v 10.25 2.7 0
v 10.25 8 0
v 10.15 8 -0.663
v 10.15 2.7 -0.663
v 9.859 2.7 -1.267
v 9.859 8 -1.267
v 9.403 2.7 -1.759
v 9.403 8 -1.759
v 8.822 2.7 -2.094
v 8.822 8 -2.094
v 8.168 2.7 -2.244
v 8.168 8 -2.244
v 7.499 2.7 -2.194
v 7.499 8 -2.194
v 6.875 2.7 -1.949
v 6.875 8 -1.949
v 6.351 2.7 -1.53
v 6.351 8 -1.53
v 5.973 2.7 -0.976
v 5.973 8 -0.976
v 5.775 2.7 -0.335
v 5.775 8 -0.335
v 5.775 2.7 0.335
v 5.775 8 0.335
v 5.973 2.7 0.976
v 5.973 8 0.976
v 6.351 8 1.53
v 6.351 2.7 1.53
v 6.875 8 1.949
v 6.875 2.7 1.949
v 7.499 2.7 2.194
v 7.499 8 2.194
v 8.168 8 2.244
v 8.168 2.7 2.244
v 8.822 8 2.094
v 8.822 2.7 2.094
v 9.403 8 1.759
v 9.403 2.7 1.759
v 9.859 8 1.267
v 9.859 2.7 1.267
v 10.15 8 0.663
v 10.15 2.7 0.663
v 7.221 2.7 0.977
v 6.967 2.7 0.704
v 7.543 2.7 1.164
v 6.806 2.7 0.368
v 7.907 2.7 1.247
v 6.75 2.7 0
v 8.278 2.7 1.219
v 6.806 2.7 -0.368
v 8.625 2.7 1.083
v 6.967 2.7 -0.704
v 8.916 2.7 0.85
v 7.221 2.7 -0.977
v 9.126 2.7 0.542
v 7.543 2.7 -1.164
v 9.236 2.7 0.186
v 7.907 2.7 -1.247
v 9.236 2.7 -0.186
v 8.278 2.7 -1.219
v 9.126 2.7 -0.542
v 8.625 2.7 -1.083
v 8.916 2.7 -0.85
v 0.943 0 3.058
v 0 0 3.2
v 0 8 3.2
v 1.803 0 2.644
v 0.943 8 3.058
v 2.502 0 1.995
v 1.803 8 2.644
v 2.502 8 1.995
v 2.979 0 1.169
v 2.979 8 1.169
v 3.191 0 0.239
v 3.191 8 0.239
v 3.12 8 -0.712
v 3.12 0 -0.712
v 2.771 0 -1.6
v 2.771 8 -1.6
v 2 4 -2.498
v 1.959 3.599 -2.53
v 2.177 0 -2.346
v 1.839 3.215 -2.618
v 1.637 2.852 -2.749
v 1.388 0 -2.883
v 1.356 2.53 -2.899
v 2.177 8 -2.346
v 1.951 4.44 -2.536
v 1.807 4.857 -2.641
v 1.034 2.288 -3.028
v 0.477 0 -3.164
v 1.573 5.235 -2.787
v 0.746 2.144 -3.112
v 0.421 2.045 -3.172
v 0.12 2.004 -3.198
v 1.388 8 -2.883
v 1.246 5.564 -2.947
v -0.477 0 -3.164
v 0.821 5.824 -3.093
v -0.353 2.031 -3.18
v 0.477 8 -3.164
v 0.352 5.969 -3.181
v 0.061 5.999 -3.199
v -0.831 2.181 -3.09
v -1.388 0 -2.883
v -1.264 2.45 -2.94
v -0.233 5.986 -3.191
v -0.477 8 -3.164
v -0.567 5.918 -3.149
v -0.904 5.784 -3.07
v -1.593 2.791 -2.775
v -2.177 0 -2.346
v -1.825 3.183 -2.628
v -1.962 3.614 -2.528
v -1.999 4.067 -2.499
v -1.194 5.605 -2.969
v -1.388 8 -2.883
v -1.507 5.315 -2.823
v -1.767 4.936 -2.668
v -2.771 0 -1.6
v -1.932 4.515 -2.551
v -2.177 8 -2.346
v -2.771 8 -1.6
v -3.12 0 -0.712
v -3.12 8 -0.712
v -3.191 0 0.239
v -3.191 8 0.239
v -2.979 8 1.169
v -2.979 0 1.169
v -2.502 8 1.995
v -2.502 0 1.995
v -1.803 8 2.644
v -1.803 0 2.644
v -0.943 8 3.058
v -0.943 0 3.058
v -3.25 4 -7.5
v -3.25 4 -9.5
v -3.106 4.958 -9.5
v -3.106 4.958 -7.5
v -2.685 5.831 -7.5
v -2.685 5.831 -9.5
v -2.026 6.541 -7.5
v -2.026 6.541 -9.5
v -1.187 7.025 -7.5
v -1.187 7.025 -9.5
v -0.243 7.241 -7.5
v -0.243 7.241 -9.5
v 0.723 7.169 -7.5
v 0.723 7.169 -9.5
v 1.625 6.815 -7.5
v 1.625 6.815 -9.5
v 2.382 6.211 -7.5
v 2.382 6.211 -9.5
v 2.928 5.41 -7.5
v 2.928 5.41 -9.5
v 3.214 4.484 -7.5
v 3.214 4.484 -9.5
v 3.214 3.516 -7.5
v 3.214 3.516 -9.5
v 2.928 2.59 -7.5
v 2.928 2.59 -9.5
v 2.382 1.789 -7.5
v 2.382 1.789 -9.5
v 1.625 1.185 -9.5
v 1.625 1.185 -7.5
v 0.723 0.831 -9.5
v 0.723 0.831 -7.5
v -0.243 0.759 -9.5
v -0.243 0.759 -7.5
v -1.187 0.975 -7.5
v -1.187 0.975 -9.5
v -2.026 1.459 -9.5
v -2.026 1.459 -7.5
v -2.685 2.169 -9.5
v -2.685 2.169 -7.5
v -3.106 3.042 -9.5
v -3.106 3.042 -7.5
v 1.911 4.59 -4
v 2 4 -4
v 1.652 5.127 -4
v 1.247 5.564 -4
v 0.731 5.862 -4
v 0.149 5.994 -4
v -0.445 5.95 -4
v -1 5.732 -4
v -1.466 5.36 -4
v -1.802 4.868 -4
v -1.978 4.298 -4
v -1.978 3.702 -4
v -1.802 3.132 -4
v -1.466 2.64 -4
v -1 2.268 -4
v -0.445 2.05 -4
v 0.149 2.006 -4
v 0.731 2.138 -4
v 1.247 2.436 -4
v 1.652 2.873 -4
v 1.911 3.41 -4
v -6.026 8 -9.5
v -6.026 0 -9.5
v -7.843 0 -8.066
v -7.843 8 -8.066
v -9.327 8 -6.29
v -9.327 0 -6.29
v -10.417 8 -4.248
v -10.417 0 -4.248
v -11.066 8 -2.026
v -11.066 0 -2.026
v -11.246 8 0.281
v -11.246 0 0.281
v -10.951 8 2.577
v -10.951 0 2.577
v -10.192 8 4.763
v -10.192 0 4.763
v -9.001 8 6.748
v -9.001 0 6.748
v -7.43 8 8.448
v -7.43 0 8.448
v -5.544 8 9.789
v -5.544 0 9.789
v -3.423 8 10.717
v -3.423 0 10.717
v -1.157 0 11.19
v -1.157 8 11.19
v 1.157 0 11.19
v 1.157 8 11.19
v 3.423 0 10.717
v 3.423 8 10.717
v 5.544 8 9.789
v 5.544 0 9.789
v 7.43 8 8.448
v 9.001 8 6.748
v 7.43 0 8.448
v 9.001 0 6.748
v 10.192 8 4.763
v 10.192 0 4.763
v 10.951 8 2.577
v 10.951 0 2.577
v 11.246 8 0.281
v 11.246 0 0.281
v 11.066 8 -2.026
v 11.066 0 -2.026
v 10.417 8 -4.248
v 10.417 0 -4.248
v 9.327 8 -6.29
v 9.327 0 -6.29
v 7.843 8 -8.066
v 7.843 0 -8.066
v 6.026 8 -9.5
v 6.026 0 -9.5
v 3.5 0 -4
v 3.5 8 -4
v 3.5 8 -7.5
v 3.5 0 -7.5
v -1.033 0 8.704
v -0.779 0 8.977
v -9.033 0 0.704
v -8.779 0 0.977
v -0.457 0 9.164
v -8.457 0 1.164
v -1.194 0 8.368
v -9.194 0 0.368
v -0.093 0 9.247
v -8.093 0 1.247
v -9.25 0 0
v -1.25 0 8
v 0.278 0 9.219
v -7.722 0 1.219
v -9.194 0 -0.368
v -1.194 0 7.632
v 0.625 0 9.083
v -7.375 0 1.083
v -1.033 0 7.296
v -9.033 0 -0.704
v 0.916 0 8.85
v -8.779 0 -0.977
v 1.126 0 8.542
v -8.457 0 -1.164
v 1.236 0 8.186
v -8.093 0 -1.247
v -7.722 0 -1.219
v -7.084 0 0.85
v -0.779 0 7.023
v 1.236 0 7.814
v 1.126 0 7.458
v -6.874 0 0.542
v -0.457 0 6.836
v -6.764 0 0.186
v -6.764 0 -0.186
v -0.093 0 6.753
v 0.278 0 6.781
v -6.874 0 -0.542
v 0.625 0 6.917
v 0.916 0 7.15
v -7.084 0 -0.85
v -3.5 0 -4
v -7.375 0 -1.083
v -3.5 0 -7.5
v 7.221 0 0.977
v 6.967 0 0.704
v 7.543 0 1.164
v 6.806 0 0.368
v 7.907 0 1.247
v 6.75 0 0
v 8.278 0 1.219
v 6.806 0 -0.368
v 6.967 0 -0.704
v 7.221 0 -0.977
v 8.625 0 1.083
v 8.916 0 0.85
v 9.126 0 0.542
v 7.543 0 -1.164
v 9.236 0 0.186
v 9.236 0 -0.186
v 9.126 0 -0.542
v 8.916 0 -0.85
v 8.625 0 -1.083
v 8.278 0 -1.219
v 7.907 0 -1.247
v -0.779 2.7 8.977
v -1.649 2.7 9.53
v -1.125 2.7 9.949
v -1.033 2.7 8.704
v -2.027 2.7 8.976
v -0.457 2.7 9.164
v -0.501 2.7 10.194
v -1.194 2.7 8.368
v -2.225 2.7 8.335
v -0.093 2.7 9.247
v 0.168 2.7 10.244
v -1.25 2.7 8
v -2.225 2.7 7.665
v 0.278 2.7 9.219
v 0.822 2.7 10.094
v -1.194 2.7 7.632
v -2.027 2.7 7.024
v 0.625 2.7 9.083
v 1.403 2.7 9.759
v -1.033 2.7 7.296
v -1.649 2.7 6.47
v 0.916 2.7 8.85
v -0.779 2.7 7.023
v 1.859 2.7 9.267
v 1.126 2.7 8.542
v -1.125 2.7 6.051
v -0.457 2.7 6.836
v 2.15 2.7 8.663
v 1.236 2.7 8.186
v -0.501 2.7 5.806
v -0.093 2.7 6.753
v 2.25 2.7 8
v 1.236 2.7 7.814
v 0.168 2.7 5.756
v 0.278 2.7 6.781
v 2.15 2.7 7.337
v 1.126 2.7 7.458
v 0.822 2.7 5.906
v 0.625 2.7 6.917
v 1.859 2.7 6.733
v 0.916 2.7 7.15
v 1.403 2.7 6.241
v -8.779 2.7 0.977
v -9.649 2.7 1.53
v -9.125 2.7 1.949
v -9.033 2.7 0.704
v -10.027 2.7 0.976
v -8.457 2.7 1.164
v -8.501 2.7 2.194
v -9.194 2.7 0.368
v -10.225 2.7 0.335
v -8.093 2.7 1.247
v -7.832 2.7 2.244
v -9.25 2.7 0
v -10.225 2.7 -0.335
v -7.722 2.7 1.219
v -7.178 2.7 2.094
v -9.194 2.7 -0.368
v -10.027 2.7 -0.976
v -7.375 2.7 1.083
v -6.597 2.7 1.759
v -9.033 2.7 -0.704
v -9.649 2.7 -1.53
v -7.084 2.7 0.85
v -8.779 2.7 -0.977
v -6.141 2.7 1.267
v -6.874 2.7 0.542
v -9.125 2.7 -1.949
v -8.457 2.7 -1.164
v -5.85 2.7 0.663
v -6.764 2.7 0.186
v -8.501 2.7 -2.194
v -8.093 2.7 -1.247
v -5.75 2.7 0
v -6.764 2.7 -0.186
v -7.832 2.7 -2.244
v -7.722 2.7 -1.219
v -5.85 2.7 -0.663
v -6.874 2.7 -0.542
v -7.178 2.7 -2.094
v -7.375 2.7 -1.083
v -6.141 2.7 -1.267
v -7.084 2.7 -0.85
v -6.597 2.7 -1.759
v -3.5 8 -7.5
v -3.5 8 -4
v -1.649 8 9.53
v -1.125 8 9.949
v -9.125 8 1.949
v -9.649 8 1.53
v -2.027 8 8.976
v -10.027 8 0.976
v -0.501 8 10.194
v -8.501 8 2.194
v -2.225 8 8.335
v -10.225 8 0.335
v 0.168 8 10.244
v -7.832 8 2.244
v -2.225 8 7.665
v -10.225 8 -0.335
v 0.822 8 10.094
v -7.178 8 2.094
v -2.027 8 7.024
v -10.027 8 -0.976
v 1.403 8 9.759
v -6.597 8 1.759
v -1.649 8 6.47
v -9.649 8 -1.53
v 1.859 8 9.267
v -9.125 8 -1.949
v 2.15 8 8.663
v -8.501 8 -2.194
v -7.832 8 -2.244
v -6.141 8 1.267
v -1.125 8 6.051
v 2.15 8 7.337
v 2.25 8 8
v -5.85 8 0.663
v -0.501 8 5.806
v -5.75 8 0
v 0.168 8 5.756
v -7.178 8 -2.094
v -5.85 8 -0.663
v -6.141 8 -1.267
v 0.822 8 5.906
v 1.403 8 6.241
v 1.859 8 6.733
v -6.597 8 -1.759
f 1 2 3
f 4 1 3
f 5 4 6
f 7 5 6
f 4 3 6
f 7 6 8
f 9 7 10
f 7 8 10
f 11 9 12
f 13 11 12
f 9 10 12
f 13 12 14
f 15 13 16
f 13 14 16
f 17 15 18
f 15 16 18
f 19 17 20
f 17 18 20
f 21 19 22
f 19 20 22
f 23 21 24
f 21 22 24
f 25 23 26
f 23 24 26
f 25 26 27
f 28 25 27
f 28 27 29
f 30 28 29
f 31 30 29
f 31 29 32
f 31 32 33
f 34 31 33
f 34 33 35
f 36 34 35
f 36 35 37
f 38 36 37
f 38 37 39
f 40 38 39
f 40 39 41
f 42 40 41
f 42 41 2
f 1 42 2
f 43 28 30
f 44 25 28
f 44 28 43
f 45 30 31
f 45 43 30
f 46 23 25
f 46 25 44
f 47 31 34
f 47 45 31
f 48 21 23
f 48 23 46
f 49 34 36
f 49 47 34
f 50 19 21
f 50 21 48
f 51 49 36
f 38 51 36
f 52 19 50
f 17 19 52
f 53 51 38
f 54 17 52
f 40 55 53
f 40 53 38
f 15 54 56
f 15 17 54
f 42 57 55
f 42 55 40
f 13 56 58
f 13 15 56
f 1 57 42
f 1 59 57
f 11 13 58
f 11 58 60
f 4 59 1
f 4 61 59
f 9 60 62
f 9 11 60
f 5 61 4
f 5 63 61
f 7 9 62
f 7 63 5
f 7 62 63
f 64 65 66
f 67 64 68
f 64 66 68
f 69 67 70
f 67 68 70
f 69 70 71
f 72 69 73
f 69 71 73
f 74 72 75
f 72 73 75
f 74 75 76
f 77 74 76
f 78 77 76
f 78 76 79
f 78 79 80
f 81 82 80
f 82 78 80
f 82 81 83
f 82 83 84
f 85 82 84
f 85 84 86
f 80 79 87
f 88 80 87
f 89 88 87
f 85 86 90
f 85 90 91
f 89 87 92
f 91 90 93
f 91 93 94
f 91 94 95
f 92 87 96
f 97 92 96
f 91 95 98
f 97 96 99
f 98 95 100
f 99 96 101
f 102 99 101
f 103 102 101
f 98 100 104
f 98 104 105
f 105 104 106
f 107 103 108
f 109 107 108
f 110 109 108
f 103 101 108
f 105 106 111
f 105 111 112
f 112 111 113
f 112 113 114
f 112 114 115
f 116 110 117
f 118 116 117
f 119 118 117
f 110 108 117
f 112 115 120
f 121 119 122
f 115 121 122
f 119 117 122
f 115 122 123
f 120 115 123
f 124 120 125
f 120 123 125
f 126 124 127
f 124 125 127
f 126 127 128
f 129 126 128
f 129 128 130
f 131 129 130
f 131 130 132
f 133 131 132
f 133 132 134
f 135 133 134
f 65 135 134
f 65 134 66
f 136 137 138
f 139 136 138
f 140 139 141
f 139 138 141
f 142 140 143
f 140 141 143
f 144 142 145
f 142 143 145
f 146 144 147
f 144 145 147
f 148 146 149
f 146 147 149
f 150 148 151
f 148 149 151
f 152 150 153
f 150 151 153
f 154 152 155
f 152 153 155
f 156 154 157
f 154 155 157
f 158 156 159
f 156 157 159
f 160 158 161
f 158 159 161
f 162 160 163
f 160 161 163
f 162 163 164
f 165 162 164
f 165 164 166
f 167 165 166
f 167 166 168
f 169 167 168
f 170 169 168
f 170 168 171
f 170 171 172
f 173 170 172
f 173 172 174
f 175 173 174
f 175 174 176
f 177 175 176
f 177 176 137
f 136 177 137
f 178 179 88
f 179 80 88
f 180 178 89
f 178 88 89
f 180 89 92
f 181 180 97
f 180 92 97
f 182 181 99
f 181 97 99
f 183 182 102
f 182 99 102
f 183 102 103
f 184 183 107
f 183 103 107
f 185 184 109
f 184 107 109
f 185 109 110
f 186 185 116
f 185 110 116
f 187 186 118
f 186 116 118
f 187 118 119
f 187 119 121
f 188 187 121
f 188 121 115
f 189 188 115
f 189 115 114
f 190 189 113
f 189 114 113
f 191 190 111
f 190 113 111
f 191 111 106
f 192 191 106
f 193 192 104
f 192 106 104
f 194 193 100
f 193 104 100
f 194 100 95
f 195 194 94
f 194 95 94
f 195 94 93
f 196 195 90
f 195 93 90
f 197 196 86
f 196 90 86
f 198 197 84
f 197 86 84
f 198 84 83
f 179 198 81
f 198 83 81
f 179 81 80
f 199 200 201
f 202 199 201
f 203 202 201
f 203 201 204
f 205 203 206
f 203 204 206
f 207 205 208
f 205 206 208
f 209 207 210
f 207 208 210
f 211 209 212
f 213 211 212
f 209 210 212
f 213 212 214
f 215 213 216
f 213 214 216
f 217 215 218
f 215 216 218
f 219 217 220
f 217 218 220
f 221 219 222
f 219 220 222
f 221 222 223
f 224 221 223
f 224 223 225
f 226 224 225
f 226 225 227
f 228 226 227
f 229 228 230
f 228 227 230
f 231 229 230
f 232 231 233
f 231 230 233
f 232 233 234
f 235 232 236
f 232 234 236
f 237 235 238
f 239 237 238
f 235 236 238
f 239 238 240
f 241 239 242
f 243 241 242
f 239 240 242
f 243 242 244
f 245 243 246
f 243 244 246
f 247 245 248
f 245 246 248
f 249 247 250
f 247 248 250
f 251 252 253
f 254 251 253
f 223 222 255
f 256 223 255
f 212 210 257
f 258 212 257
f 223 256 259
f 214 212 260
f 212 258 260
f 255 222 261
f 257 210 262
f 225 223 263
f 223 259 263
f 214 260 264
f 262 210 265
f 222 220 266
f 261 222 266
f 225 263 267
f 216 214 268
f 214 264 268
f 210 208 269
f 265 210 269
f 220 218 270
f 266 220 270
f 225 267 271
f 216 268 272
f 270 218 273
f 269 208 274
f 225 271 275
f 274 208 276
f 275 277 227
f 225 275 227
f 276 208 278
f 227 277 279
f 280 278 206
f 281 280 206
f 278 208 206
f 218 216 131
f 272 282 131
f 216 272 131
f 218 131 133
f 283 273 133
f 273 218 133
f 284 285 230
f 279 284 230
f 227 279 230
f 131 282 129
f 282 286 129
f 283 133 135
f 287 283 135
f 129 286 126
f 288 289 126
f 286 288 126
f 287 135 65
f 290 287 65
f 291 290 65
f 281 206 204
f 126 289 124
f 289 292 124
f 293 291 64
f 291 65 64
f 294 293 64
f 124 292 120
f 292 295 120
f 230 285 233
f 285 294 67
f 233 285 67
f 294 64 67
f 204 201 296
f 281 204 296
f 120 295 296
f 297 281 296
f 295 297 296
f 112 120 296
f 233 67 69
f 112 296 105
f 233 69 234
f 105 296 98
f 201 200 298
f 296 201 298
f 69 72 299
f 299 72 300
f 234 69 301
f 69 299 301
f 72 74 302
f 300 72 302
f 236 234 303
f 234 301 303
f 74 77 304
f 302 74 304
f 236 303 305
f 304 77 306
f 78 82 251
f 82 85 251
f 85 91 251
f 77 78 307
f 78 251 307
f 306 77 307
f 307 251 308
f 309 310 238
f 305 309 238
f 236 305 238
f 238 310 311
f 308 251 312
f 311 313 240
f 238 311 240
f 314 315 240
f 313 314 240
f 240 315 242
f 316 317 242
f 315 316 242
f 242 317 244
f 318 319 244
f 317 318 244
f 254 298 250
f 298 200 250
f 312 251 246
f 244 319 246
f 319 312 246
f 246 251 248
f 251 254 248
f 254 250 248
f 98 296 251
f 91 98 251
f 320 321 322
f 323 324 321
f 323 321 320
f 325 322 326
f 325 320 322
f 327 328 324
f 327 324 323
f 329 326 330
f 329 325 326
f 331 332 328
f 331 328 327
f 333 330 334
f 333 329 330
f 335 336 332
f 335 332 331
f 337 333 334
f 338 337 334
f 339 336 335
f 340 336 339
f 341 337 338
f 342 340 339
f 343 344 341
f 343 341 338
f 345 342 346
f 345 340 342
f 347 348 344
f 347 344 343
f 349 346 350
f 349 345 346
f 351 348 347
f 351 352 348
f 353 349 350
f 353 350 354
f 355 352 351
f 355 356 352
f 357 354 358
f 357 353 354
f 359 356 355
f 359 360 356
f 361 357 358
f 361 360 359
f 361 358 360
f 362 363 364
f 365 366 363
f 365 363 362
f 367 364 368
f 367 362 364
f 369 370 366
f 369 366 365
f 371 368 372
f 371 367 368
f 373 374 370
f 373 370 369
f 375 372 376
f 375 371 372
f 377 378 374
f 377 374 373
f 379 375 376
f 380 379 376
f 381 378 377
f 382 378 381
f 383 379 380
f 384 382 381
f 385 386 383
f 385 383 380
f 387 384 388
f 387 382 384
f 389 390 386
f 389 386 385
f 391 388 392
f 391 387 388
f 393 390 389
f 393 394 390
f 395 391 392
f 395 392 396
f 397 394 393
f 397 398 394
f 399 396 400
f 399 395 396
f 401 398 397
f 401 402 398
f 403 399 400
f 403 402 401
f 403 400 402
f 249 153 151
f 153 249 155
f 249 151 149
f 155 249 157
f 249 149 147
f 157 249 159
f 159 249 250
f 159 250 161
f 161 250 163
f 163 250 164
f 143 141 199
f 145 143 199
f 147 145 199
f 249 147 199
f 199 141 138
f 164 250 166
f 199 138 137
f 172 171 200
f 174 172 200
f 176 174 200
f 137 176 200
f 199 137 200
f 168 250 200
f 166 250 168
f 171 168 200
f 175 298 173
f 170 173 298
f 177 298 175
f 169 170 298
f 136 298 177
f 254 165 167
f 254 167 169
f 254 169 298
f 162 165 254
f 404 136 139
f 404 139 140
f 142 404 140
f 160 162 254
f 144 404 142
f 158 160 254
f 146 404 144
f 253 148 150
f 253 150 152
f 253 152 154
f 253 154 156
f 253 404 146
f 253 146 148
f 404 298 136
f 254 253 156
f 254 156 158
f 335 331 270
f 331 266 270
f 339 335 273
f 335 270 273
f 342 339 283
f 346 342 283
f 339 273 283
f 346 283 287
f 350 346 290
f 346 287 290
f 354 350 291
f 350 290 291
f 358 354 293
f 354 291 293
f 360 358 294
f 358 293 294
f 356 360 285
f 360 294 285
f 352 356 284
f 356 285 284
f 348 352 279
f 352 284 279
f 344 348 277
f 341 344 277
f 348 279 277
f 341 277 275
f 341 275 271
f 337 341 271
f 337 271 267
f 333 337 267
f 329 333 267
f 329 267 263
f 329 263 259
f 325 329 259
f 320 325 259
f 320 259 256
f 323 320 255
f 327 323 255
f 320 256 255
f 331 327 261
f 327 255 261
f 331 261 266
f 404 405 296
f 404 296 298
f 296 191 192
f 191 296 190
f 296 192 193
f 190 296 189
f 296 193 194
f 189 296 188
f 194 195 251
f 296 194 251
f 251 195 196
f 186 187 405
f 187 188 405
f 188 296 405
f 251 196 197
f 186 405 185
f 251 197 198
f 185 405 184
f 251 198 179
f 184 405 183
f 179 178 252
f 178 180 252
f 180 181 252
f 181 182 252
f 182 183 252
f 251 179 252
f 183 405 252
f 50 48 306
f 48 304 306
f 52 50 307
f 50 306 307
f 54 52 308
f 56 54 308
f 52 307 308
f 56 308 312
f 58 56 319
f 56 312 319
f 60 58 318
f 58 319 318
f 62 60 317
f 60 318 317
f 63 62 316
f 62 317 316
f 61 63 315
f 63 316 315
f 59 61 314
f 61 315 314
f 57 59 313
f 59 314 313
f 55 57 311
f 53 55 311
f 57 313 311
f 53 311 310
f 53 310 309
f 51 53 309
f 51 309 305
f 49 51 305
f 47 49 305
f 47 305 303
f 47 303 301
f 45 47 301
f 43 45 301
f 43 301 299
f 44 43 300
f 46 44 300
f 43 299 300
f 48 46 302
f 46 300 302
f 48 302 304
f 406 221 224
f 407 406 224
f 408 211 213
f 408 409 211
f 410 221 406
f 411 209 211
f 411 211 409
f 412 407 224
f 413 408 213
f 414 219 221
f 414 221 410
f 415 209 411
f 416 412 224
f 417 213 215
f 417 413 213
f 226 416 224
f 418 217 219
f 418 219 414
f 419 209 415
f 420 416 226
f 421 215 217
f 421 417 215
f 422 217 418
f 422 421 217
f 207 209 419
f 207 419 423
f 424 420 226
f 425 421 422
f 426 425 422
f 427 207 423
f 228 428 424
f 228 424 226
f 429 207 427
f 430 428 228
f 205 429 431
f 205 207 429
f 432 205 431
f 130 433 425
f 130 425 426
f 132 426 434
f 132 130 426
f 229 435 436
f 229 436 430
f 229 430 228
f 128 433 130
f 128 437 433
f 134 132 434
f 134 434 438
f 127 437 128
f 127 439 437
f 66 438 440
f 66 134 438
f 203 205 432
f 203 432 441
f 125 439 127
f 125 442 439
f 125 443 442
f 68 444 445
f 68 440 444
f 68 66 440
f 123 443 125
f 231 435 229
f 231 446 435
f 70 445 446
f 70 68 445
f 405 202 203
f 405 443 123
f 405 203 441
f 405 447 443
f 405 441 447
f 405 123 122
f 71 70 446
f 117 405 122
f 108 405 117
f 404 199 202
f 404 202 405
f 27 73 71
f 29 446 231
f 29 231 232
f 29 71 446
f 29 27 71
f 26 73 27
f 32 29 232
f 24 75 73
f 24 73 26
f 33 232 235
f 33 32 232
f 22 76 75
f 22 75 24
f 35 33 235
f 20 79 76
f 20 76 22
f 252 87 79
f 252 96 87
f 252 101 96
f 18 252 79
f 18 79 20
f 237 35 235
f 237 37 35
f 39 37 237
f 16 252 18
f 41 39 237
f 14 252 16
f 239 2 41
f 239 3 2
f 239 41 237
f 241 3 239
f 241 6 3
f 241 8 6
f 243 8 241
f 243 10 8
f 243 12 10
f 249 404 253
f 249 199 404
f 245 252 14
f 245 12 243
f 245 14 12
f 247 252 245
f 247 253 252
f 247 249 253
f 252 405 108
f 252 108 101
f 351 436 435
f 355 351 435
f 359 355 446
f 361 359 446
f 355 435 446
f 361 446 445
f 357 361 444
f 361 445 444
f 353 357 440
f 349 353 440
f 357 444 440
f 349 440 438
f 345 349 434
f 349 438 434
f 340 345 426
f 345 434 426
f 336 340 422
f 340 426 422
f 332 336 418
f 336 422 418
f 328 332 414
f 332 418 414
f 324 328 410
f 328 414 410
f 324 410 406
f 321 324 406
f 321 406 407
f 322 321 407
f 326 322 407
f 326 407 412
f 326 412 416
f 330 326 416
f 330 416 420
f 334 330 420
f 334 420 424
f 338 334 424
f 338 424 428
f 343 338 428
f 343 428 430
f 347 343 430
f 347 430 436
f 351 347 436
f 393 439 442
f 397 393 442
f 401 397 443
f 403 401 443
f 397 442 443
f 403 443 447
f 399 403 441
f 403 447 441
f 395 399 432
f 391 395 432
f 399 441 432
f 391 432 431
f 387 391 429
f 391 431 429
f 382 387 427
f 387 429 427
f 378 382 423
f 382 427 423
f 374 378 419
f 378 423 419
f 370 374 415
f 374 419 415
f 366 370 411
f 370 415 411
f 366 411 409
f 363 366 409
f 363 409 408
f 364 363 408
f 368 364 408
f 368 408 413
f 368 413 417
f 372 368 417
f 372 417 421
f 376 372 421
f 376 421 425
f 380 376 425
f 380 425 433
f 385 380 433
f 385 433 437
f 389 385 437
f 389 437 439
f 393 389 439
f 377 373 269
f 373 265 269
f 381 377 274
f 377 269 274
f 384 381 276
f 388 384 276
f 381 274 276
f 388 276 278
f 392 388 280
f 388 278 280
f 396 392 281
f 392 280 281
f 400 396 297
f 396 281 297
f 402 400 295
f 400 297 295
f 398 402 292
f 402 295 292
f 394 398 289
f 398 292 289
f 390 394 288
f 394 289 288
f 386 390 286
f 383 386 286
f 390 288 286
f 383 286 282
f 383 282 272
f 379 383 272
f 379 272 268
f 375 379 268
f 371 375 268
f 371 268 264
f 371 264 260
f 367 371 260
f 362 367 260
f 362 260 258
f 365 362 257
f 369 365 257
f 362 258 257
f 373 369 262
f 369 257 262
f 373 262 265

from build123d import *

# Parameters (mm, degrees)
BOSS_EXTRU_1_DEPTH                              = 8
SKETCH1_R                                       = 3.2
CUT_EXTRUDE1_DEPTH                              = 18.808003819
ESQUISSE7_W                                     = 7
ESQUISSE7_H                                     = 3.5
ENL_V_MAT_EXTRU_2_DEPTH                         = 18.808003819
CHAMBRAGE_POUR_VIS_T_TE_CYLINDRIQUE_D           = 2.5
CHAMBRAGE_POUR_VIS_T_TE_CYLINDRIQUE_CBORE_D     = 4.5
CHAMBRAGE_POUR_VIS_T_TE_CYLINDRIQUE_CBORE_DEPTH = 5.3
CBORE_FOR_M5_HEX_HEAD_BOLT1_D                   = 4
CBORE_FOR_M5_HEX_HEAD_BOLT1_DEPTH               = 9.499
CBORE_FOR_M5_HEX_HEAD_BOLT1_CBORE_D             = 6.5
CBORE_FOR_M5_HEX_HEAD_BOLT1_CBORE_DEPTH         = 2
CBORE_FOR_M5_HEX_HEAD_BOLT1_TIP                 = 1.201721238


with BuildPart() as part:
    # Esquisse1 → Boss.-Extru.1 (new body)
    with BuildSketch(Plane(origin=(0, 0, 0), x_dir=(1, 0, 0), z_dir=(0, 1, 0))):
        with BuildLine():
            Line((6.025985397, 9.5), (-6.025985397, 9.5))
            ThreePointArc((-6.025985397, 9.5), (0, -11.25), (6.025985397, 9.5))
        make_face()
    extrude(amount=BOSS_EXTRU_1_DEPTH)

    # Sketch1 → Cut-Extrude1 (cut, through all)
    with BuildSketch(Plane(origin=(0, 8, 0), x_dir=(1, 0, 0), z_dir=(0, 1, 0))):
        with Locations(Location((0, 0, 0), (0, 0, 270))):
            Circle(SKETCH1_R)
    extrude(amount=-CUT_EXTRUDE1_DEPTH, mode=Mode.SUBTRACT)

    # Esquisse7 → Enlèv. mat.-Extru.2 (cut, through all)
    with BuildSketch(Plane(origin=(0, 8, 0), x_dir=(1, 0, 0), z_dir=(0, 1, 0))):
        with Locations((0, 5.75)):
            Rectangle(ESQUISSE7_W, ESQUISSE7_H)
    extrude(amount=-ENL_V_MAT_EXTRU_2_DEPTH, mode=Mode.SUBTRACT)

    # Chambrage pour vis à tête cylindrique à 6 pans creux (ou vis CHC) M21 (through all)
    with Locations(Plane(origin=(0, 8, 0), x_dir=(1, 0, 0), z_dir=(0, 1, 0))):
        with Locations((-8, 0), (0, -8), (8, 0)):
            CounterBoreHole(CHAMBRAGE_POUR_VIS_T_TE_CYLINDRIQUE_D / 2, CHAMBRAGE_POUR_VIS_T_TE_CYLINDRIQUE_CBORE_D / 2, CHAMBRAGE_POUR_VIS_T_TE_CYLINDRIQUE_CBORE_DEPTH)

    # CBORE for M5 Hex Head Bolt1
    with Locations(Plane(origin=(0, 0, -9.5), x_dir=(-1, 0, 0), z_dir=(0, 0, -1))):
        with Locations((0, 4)):
            CounterBoreHole(CBORE_FOR_M5_HEX_HEAD_BOLT1_D / 2, CBORE_FOR_M5_HEX_HEAD_BOLT1_CBORE_D / 2, CBORE_FOR_M5_HEX_HEAD_BOLT1_CBORE_DEPTH, depth=CBORE_FOR_M5_HEX_HEAD_BOLT1_DEPTH)
            with Locations((0, 0, -(CBORE_FOR_M5_HEX_HEAD_BOLT1_DEPTH + CBORE_FOR_M5_HEX_HEAD_BOLT1_TIP / 2))):  # 118° drill point
                Cone(0, CBORE_FOR_M5_HEX_HEAD_BOLT1_D / 2, CBORE_FOR_M5_HEX_HEAD_BOLT1_TIP, mode=Mode.SUBTRACT)


solid = part.part
